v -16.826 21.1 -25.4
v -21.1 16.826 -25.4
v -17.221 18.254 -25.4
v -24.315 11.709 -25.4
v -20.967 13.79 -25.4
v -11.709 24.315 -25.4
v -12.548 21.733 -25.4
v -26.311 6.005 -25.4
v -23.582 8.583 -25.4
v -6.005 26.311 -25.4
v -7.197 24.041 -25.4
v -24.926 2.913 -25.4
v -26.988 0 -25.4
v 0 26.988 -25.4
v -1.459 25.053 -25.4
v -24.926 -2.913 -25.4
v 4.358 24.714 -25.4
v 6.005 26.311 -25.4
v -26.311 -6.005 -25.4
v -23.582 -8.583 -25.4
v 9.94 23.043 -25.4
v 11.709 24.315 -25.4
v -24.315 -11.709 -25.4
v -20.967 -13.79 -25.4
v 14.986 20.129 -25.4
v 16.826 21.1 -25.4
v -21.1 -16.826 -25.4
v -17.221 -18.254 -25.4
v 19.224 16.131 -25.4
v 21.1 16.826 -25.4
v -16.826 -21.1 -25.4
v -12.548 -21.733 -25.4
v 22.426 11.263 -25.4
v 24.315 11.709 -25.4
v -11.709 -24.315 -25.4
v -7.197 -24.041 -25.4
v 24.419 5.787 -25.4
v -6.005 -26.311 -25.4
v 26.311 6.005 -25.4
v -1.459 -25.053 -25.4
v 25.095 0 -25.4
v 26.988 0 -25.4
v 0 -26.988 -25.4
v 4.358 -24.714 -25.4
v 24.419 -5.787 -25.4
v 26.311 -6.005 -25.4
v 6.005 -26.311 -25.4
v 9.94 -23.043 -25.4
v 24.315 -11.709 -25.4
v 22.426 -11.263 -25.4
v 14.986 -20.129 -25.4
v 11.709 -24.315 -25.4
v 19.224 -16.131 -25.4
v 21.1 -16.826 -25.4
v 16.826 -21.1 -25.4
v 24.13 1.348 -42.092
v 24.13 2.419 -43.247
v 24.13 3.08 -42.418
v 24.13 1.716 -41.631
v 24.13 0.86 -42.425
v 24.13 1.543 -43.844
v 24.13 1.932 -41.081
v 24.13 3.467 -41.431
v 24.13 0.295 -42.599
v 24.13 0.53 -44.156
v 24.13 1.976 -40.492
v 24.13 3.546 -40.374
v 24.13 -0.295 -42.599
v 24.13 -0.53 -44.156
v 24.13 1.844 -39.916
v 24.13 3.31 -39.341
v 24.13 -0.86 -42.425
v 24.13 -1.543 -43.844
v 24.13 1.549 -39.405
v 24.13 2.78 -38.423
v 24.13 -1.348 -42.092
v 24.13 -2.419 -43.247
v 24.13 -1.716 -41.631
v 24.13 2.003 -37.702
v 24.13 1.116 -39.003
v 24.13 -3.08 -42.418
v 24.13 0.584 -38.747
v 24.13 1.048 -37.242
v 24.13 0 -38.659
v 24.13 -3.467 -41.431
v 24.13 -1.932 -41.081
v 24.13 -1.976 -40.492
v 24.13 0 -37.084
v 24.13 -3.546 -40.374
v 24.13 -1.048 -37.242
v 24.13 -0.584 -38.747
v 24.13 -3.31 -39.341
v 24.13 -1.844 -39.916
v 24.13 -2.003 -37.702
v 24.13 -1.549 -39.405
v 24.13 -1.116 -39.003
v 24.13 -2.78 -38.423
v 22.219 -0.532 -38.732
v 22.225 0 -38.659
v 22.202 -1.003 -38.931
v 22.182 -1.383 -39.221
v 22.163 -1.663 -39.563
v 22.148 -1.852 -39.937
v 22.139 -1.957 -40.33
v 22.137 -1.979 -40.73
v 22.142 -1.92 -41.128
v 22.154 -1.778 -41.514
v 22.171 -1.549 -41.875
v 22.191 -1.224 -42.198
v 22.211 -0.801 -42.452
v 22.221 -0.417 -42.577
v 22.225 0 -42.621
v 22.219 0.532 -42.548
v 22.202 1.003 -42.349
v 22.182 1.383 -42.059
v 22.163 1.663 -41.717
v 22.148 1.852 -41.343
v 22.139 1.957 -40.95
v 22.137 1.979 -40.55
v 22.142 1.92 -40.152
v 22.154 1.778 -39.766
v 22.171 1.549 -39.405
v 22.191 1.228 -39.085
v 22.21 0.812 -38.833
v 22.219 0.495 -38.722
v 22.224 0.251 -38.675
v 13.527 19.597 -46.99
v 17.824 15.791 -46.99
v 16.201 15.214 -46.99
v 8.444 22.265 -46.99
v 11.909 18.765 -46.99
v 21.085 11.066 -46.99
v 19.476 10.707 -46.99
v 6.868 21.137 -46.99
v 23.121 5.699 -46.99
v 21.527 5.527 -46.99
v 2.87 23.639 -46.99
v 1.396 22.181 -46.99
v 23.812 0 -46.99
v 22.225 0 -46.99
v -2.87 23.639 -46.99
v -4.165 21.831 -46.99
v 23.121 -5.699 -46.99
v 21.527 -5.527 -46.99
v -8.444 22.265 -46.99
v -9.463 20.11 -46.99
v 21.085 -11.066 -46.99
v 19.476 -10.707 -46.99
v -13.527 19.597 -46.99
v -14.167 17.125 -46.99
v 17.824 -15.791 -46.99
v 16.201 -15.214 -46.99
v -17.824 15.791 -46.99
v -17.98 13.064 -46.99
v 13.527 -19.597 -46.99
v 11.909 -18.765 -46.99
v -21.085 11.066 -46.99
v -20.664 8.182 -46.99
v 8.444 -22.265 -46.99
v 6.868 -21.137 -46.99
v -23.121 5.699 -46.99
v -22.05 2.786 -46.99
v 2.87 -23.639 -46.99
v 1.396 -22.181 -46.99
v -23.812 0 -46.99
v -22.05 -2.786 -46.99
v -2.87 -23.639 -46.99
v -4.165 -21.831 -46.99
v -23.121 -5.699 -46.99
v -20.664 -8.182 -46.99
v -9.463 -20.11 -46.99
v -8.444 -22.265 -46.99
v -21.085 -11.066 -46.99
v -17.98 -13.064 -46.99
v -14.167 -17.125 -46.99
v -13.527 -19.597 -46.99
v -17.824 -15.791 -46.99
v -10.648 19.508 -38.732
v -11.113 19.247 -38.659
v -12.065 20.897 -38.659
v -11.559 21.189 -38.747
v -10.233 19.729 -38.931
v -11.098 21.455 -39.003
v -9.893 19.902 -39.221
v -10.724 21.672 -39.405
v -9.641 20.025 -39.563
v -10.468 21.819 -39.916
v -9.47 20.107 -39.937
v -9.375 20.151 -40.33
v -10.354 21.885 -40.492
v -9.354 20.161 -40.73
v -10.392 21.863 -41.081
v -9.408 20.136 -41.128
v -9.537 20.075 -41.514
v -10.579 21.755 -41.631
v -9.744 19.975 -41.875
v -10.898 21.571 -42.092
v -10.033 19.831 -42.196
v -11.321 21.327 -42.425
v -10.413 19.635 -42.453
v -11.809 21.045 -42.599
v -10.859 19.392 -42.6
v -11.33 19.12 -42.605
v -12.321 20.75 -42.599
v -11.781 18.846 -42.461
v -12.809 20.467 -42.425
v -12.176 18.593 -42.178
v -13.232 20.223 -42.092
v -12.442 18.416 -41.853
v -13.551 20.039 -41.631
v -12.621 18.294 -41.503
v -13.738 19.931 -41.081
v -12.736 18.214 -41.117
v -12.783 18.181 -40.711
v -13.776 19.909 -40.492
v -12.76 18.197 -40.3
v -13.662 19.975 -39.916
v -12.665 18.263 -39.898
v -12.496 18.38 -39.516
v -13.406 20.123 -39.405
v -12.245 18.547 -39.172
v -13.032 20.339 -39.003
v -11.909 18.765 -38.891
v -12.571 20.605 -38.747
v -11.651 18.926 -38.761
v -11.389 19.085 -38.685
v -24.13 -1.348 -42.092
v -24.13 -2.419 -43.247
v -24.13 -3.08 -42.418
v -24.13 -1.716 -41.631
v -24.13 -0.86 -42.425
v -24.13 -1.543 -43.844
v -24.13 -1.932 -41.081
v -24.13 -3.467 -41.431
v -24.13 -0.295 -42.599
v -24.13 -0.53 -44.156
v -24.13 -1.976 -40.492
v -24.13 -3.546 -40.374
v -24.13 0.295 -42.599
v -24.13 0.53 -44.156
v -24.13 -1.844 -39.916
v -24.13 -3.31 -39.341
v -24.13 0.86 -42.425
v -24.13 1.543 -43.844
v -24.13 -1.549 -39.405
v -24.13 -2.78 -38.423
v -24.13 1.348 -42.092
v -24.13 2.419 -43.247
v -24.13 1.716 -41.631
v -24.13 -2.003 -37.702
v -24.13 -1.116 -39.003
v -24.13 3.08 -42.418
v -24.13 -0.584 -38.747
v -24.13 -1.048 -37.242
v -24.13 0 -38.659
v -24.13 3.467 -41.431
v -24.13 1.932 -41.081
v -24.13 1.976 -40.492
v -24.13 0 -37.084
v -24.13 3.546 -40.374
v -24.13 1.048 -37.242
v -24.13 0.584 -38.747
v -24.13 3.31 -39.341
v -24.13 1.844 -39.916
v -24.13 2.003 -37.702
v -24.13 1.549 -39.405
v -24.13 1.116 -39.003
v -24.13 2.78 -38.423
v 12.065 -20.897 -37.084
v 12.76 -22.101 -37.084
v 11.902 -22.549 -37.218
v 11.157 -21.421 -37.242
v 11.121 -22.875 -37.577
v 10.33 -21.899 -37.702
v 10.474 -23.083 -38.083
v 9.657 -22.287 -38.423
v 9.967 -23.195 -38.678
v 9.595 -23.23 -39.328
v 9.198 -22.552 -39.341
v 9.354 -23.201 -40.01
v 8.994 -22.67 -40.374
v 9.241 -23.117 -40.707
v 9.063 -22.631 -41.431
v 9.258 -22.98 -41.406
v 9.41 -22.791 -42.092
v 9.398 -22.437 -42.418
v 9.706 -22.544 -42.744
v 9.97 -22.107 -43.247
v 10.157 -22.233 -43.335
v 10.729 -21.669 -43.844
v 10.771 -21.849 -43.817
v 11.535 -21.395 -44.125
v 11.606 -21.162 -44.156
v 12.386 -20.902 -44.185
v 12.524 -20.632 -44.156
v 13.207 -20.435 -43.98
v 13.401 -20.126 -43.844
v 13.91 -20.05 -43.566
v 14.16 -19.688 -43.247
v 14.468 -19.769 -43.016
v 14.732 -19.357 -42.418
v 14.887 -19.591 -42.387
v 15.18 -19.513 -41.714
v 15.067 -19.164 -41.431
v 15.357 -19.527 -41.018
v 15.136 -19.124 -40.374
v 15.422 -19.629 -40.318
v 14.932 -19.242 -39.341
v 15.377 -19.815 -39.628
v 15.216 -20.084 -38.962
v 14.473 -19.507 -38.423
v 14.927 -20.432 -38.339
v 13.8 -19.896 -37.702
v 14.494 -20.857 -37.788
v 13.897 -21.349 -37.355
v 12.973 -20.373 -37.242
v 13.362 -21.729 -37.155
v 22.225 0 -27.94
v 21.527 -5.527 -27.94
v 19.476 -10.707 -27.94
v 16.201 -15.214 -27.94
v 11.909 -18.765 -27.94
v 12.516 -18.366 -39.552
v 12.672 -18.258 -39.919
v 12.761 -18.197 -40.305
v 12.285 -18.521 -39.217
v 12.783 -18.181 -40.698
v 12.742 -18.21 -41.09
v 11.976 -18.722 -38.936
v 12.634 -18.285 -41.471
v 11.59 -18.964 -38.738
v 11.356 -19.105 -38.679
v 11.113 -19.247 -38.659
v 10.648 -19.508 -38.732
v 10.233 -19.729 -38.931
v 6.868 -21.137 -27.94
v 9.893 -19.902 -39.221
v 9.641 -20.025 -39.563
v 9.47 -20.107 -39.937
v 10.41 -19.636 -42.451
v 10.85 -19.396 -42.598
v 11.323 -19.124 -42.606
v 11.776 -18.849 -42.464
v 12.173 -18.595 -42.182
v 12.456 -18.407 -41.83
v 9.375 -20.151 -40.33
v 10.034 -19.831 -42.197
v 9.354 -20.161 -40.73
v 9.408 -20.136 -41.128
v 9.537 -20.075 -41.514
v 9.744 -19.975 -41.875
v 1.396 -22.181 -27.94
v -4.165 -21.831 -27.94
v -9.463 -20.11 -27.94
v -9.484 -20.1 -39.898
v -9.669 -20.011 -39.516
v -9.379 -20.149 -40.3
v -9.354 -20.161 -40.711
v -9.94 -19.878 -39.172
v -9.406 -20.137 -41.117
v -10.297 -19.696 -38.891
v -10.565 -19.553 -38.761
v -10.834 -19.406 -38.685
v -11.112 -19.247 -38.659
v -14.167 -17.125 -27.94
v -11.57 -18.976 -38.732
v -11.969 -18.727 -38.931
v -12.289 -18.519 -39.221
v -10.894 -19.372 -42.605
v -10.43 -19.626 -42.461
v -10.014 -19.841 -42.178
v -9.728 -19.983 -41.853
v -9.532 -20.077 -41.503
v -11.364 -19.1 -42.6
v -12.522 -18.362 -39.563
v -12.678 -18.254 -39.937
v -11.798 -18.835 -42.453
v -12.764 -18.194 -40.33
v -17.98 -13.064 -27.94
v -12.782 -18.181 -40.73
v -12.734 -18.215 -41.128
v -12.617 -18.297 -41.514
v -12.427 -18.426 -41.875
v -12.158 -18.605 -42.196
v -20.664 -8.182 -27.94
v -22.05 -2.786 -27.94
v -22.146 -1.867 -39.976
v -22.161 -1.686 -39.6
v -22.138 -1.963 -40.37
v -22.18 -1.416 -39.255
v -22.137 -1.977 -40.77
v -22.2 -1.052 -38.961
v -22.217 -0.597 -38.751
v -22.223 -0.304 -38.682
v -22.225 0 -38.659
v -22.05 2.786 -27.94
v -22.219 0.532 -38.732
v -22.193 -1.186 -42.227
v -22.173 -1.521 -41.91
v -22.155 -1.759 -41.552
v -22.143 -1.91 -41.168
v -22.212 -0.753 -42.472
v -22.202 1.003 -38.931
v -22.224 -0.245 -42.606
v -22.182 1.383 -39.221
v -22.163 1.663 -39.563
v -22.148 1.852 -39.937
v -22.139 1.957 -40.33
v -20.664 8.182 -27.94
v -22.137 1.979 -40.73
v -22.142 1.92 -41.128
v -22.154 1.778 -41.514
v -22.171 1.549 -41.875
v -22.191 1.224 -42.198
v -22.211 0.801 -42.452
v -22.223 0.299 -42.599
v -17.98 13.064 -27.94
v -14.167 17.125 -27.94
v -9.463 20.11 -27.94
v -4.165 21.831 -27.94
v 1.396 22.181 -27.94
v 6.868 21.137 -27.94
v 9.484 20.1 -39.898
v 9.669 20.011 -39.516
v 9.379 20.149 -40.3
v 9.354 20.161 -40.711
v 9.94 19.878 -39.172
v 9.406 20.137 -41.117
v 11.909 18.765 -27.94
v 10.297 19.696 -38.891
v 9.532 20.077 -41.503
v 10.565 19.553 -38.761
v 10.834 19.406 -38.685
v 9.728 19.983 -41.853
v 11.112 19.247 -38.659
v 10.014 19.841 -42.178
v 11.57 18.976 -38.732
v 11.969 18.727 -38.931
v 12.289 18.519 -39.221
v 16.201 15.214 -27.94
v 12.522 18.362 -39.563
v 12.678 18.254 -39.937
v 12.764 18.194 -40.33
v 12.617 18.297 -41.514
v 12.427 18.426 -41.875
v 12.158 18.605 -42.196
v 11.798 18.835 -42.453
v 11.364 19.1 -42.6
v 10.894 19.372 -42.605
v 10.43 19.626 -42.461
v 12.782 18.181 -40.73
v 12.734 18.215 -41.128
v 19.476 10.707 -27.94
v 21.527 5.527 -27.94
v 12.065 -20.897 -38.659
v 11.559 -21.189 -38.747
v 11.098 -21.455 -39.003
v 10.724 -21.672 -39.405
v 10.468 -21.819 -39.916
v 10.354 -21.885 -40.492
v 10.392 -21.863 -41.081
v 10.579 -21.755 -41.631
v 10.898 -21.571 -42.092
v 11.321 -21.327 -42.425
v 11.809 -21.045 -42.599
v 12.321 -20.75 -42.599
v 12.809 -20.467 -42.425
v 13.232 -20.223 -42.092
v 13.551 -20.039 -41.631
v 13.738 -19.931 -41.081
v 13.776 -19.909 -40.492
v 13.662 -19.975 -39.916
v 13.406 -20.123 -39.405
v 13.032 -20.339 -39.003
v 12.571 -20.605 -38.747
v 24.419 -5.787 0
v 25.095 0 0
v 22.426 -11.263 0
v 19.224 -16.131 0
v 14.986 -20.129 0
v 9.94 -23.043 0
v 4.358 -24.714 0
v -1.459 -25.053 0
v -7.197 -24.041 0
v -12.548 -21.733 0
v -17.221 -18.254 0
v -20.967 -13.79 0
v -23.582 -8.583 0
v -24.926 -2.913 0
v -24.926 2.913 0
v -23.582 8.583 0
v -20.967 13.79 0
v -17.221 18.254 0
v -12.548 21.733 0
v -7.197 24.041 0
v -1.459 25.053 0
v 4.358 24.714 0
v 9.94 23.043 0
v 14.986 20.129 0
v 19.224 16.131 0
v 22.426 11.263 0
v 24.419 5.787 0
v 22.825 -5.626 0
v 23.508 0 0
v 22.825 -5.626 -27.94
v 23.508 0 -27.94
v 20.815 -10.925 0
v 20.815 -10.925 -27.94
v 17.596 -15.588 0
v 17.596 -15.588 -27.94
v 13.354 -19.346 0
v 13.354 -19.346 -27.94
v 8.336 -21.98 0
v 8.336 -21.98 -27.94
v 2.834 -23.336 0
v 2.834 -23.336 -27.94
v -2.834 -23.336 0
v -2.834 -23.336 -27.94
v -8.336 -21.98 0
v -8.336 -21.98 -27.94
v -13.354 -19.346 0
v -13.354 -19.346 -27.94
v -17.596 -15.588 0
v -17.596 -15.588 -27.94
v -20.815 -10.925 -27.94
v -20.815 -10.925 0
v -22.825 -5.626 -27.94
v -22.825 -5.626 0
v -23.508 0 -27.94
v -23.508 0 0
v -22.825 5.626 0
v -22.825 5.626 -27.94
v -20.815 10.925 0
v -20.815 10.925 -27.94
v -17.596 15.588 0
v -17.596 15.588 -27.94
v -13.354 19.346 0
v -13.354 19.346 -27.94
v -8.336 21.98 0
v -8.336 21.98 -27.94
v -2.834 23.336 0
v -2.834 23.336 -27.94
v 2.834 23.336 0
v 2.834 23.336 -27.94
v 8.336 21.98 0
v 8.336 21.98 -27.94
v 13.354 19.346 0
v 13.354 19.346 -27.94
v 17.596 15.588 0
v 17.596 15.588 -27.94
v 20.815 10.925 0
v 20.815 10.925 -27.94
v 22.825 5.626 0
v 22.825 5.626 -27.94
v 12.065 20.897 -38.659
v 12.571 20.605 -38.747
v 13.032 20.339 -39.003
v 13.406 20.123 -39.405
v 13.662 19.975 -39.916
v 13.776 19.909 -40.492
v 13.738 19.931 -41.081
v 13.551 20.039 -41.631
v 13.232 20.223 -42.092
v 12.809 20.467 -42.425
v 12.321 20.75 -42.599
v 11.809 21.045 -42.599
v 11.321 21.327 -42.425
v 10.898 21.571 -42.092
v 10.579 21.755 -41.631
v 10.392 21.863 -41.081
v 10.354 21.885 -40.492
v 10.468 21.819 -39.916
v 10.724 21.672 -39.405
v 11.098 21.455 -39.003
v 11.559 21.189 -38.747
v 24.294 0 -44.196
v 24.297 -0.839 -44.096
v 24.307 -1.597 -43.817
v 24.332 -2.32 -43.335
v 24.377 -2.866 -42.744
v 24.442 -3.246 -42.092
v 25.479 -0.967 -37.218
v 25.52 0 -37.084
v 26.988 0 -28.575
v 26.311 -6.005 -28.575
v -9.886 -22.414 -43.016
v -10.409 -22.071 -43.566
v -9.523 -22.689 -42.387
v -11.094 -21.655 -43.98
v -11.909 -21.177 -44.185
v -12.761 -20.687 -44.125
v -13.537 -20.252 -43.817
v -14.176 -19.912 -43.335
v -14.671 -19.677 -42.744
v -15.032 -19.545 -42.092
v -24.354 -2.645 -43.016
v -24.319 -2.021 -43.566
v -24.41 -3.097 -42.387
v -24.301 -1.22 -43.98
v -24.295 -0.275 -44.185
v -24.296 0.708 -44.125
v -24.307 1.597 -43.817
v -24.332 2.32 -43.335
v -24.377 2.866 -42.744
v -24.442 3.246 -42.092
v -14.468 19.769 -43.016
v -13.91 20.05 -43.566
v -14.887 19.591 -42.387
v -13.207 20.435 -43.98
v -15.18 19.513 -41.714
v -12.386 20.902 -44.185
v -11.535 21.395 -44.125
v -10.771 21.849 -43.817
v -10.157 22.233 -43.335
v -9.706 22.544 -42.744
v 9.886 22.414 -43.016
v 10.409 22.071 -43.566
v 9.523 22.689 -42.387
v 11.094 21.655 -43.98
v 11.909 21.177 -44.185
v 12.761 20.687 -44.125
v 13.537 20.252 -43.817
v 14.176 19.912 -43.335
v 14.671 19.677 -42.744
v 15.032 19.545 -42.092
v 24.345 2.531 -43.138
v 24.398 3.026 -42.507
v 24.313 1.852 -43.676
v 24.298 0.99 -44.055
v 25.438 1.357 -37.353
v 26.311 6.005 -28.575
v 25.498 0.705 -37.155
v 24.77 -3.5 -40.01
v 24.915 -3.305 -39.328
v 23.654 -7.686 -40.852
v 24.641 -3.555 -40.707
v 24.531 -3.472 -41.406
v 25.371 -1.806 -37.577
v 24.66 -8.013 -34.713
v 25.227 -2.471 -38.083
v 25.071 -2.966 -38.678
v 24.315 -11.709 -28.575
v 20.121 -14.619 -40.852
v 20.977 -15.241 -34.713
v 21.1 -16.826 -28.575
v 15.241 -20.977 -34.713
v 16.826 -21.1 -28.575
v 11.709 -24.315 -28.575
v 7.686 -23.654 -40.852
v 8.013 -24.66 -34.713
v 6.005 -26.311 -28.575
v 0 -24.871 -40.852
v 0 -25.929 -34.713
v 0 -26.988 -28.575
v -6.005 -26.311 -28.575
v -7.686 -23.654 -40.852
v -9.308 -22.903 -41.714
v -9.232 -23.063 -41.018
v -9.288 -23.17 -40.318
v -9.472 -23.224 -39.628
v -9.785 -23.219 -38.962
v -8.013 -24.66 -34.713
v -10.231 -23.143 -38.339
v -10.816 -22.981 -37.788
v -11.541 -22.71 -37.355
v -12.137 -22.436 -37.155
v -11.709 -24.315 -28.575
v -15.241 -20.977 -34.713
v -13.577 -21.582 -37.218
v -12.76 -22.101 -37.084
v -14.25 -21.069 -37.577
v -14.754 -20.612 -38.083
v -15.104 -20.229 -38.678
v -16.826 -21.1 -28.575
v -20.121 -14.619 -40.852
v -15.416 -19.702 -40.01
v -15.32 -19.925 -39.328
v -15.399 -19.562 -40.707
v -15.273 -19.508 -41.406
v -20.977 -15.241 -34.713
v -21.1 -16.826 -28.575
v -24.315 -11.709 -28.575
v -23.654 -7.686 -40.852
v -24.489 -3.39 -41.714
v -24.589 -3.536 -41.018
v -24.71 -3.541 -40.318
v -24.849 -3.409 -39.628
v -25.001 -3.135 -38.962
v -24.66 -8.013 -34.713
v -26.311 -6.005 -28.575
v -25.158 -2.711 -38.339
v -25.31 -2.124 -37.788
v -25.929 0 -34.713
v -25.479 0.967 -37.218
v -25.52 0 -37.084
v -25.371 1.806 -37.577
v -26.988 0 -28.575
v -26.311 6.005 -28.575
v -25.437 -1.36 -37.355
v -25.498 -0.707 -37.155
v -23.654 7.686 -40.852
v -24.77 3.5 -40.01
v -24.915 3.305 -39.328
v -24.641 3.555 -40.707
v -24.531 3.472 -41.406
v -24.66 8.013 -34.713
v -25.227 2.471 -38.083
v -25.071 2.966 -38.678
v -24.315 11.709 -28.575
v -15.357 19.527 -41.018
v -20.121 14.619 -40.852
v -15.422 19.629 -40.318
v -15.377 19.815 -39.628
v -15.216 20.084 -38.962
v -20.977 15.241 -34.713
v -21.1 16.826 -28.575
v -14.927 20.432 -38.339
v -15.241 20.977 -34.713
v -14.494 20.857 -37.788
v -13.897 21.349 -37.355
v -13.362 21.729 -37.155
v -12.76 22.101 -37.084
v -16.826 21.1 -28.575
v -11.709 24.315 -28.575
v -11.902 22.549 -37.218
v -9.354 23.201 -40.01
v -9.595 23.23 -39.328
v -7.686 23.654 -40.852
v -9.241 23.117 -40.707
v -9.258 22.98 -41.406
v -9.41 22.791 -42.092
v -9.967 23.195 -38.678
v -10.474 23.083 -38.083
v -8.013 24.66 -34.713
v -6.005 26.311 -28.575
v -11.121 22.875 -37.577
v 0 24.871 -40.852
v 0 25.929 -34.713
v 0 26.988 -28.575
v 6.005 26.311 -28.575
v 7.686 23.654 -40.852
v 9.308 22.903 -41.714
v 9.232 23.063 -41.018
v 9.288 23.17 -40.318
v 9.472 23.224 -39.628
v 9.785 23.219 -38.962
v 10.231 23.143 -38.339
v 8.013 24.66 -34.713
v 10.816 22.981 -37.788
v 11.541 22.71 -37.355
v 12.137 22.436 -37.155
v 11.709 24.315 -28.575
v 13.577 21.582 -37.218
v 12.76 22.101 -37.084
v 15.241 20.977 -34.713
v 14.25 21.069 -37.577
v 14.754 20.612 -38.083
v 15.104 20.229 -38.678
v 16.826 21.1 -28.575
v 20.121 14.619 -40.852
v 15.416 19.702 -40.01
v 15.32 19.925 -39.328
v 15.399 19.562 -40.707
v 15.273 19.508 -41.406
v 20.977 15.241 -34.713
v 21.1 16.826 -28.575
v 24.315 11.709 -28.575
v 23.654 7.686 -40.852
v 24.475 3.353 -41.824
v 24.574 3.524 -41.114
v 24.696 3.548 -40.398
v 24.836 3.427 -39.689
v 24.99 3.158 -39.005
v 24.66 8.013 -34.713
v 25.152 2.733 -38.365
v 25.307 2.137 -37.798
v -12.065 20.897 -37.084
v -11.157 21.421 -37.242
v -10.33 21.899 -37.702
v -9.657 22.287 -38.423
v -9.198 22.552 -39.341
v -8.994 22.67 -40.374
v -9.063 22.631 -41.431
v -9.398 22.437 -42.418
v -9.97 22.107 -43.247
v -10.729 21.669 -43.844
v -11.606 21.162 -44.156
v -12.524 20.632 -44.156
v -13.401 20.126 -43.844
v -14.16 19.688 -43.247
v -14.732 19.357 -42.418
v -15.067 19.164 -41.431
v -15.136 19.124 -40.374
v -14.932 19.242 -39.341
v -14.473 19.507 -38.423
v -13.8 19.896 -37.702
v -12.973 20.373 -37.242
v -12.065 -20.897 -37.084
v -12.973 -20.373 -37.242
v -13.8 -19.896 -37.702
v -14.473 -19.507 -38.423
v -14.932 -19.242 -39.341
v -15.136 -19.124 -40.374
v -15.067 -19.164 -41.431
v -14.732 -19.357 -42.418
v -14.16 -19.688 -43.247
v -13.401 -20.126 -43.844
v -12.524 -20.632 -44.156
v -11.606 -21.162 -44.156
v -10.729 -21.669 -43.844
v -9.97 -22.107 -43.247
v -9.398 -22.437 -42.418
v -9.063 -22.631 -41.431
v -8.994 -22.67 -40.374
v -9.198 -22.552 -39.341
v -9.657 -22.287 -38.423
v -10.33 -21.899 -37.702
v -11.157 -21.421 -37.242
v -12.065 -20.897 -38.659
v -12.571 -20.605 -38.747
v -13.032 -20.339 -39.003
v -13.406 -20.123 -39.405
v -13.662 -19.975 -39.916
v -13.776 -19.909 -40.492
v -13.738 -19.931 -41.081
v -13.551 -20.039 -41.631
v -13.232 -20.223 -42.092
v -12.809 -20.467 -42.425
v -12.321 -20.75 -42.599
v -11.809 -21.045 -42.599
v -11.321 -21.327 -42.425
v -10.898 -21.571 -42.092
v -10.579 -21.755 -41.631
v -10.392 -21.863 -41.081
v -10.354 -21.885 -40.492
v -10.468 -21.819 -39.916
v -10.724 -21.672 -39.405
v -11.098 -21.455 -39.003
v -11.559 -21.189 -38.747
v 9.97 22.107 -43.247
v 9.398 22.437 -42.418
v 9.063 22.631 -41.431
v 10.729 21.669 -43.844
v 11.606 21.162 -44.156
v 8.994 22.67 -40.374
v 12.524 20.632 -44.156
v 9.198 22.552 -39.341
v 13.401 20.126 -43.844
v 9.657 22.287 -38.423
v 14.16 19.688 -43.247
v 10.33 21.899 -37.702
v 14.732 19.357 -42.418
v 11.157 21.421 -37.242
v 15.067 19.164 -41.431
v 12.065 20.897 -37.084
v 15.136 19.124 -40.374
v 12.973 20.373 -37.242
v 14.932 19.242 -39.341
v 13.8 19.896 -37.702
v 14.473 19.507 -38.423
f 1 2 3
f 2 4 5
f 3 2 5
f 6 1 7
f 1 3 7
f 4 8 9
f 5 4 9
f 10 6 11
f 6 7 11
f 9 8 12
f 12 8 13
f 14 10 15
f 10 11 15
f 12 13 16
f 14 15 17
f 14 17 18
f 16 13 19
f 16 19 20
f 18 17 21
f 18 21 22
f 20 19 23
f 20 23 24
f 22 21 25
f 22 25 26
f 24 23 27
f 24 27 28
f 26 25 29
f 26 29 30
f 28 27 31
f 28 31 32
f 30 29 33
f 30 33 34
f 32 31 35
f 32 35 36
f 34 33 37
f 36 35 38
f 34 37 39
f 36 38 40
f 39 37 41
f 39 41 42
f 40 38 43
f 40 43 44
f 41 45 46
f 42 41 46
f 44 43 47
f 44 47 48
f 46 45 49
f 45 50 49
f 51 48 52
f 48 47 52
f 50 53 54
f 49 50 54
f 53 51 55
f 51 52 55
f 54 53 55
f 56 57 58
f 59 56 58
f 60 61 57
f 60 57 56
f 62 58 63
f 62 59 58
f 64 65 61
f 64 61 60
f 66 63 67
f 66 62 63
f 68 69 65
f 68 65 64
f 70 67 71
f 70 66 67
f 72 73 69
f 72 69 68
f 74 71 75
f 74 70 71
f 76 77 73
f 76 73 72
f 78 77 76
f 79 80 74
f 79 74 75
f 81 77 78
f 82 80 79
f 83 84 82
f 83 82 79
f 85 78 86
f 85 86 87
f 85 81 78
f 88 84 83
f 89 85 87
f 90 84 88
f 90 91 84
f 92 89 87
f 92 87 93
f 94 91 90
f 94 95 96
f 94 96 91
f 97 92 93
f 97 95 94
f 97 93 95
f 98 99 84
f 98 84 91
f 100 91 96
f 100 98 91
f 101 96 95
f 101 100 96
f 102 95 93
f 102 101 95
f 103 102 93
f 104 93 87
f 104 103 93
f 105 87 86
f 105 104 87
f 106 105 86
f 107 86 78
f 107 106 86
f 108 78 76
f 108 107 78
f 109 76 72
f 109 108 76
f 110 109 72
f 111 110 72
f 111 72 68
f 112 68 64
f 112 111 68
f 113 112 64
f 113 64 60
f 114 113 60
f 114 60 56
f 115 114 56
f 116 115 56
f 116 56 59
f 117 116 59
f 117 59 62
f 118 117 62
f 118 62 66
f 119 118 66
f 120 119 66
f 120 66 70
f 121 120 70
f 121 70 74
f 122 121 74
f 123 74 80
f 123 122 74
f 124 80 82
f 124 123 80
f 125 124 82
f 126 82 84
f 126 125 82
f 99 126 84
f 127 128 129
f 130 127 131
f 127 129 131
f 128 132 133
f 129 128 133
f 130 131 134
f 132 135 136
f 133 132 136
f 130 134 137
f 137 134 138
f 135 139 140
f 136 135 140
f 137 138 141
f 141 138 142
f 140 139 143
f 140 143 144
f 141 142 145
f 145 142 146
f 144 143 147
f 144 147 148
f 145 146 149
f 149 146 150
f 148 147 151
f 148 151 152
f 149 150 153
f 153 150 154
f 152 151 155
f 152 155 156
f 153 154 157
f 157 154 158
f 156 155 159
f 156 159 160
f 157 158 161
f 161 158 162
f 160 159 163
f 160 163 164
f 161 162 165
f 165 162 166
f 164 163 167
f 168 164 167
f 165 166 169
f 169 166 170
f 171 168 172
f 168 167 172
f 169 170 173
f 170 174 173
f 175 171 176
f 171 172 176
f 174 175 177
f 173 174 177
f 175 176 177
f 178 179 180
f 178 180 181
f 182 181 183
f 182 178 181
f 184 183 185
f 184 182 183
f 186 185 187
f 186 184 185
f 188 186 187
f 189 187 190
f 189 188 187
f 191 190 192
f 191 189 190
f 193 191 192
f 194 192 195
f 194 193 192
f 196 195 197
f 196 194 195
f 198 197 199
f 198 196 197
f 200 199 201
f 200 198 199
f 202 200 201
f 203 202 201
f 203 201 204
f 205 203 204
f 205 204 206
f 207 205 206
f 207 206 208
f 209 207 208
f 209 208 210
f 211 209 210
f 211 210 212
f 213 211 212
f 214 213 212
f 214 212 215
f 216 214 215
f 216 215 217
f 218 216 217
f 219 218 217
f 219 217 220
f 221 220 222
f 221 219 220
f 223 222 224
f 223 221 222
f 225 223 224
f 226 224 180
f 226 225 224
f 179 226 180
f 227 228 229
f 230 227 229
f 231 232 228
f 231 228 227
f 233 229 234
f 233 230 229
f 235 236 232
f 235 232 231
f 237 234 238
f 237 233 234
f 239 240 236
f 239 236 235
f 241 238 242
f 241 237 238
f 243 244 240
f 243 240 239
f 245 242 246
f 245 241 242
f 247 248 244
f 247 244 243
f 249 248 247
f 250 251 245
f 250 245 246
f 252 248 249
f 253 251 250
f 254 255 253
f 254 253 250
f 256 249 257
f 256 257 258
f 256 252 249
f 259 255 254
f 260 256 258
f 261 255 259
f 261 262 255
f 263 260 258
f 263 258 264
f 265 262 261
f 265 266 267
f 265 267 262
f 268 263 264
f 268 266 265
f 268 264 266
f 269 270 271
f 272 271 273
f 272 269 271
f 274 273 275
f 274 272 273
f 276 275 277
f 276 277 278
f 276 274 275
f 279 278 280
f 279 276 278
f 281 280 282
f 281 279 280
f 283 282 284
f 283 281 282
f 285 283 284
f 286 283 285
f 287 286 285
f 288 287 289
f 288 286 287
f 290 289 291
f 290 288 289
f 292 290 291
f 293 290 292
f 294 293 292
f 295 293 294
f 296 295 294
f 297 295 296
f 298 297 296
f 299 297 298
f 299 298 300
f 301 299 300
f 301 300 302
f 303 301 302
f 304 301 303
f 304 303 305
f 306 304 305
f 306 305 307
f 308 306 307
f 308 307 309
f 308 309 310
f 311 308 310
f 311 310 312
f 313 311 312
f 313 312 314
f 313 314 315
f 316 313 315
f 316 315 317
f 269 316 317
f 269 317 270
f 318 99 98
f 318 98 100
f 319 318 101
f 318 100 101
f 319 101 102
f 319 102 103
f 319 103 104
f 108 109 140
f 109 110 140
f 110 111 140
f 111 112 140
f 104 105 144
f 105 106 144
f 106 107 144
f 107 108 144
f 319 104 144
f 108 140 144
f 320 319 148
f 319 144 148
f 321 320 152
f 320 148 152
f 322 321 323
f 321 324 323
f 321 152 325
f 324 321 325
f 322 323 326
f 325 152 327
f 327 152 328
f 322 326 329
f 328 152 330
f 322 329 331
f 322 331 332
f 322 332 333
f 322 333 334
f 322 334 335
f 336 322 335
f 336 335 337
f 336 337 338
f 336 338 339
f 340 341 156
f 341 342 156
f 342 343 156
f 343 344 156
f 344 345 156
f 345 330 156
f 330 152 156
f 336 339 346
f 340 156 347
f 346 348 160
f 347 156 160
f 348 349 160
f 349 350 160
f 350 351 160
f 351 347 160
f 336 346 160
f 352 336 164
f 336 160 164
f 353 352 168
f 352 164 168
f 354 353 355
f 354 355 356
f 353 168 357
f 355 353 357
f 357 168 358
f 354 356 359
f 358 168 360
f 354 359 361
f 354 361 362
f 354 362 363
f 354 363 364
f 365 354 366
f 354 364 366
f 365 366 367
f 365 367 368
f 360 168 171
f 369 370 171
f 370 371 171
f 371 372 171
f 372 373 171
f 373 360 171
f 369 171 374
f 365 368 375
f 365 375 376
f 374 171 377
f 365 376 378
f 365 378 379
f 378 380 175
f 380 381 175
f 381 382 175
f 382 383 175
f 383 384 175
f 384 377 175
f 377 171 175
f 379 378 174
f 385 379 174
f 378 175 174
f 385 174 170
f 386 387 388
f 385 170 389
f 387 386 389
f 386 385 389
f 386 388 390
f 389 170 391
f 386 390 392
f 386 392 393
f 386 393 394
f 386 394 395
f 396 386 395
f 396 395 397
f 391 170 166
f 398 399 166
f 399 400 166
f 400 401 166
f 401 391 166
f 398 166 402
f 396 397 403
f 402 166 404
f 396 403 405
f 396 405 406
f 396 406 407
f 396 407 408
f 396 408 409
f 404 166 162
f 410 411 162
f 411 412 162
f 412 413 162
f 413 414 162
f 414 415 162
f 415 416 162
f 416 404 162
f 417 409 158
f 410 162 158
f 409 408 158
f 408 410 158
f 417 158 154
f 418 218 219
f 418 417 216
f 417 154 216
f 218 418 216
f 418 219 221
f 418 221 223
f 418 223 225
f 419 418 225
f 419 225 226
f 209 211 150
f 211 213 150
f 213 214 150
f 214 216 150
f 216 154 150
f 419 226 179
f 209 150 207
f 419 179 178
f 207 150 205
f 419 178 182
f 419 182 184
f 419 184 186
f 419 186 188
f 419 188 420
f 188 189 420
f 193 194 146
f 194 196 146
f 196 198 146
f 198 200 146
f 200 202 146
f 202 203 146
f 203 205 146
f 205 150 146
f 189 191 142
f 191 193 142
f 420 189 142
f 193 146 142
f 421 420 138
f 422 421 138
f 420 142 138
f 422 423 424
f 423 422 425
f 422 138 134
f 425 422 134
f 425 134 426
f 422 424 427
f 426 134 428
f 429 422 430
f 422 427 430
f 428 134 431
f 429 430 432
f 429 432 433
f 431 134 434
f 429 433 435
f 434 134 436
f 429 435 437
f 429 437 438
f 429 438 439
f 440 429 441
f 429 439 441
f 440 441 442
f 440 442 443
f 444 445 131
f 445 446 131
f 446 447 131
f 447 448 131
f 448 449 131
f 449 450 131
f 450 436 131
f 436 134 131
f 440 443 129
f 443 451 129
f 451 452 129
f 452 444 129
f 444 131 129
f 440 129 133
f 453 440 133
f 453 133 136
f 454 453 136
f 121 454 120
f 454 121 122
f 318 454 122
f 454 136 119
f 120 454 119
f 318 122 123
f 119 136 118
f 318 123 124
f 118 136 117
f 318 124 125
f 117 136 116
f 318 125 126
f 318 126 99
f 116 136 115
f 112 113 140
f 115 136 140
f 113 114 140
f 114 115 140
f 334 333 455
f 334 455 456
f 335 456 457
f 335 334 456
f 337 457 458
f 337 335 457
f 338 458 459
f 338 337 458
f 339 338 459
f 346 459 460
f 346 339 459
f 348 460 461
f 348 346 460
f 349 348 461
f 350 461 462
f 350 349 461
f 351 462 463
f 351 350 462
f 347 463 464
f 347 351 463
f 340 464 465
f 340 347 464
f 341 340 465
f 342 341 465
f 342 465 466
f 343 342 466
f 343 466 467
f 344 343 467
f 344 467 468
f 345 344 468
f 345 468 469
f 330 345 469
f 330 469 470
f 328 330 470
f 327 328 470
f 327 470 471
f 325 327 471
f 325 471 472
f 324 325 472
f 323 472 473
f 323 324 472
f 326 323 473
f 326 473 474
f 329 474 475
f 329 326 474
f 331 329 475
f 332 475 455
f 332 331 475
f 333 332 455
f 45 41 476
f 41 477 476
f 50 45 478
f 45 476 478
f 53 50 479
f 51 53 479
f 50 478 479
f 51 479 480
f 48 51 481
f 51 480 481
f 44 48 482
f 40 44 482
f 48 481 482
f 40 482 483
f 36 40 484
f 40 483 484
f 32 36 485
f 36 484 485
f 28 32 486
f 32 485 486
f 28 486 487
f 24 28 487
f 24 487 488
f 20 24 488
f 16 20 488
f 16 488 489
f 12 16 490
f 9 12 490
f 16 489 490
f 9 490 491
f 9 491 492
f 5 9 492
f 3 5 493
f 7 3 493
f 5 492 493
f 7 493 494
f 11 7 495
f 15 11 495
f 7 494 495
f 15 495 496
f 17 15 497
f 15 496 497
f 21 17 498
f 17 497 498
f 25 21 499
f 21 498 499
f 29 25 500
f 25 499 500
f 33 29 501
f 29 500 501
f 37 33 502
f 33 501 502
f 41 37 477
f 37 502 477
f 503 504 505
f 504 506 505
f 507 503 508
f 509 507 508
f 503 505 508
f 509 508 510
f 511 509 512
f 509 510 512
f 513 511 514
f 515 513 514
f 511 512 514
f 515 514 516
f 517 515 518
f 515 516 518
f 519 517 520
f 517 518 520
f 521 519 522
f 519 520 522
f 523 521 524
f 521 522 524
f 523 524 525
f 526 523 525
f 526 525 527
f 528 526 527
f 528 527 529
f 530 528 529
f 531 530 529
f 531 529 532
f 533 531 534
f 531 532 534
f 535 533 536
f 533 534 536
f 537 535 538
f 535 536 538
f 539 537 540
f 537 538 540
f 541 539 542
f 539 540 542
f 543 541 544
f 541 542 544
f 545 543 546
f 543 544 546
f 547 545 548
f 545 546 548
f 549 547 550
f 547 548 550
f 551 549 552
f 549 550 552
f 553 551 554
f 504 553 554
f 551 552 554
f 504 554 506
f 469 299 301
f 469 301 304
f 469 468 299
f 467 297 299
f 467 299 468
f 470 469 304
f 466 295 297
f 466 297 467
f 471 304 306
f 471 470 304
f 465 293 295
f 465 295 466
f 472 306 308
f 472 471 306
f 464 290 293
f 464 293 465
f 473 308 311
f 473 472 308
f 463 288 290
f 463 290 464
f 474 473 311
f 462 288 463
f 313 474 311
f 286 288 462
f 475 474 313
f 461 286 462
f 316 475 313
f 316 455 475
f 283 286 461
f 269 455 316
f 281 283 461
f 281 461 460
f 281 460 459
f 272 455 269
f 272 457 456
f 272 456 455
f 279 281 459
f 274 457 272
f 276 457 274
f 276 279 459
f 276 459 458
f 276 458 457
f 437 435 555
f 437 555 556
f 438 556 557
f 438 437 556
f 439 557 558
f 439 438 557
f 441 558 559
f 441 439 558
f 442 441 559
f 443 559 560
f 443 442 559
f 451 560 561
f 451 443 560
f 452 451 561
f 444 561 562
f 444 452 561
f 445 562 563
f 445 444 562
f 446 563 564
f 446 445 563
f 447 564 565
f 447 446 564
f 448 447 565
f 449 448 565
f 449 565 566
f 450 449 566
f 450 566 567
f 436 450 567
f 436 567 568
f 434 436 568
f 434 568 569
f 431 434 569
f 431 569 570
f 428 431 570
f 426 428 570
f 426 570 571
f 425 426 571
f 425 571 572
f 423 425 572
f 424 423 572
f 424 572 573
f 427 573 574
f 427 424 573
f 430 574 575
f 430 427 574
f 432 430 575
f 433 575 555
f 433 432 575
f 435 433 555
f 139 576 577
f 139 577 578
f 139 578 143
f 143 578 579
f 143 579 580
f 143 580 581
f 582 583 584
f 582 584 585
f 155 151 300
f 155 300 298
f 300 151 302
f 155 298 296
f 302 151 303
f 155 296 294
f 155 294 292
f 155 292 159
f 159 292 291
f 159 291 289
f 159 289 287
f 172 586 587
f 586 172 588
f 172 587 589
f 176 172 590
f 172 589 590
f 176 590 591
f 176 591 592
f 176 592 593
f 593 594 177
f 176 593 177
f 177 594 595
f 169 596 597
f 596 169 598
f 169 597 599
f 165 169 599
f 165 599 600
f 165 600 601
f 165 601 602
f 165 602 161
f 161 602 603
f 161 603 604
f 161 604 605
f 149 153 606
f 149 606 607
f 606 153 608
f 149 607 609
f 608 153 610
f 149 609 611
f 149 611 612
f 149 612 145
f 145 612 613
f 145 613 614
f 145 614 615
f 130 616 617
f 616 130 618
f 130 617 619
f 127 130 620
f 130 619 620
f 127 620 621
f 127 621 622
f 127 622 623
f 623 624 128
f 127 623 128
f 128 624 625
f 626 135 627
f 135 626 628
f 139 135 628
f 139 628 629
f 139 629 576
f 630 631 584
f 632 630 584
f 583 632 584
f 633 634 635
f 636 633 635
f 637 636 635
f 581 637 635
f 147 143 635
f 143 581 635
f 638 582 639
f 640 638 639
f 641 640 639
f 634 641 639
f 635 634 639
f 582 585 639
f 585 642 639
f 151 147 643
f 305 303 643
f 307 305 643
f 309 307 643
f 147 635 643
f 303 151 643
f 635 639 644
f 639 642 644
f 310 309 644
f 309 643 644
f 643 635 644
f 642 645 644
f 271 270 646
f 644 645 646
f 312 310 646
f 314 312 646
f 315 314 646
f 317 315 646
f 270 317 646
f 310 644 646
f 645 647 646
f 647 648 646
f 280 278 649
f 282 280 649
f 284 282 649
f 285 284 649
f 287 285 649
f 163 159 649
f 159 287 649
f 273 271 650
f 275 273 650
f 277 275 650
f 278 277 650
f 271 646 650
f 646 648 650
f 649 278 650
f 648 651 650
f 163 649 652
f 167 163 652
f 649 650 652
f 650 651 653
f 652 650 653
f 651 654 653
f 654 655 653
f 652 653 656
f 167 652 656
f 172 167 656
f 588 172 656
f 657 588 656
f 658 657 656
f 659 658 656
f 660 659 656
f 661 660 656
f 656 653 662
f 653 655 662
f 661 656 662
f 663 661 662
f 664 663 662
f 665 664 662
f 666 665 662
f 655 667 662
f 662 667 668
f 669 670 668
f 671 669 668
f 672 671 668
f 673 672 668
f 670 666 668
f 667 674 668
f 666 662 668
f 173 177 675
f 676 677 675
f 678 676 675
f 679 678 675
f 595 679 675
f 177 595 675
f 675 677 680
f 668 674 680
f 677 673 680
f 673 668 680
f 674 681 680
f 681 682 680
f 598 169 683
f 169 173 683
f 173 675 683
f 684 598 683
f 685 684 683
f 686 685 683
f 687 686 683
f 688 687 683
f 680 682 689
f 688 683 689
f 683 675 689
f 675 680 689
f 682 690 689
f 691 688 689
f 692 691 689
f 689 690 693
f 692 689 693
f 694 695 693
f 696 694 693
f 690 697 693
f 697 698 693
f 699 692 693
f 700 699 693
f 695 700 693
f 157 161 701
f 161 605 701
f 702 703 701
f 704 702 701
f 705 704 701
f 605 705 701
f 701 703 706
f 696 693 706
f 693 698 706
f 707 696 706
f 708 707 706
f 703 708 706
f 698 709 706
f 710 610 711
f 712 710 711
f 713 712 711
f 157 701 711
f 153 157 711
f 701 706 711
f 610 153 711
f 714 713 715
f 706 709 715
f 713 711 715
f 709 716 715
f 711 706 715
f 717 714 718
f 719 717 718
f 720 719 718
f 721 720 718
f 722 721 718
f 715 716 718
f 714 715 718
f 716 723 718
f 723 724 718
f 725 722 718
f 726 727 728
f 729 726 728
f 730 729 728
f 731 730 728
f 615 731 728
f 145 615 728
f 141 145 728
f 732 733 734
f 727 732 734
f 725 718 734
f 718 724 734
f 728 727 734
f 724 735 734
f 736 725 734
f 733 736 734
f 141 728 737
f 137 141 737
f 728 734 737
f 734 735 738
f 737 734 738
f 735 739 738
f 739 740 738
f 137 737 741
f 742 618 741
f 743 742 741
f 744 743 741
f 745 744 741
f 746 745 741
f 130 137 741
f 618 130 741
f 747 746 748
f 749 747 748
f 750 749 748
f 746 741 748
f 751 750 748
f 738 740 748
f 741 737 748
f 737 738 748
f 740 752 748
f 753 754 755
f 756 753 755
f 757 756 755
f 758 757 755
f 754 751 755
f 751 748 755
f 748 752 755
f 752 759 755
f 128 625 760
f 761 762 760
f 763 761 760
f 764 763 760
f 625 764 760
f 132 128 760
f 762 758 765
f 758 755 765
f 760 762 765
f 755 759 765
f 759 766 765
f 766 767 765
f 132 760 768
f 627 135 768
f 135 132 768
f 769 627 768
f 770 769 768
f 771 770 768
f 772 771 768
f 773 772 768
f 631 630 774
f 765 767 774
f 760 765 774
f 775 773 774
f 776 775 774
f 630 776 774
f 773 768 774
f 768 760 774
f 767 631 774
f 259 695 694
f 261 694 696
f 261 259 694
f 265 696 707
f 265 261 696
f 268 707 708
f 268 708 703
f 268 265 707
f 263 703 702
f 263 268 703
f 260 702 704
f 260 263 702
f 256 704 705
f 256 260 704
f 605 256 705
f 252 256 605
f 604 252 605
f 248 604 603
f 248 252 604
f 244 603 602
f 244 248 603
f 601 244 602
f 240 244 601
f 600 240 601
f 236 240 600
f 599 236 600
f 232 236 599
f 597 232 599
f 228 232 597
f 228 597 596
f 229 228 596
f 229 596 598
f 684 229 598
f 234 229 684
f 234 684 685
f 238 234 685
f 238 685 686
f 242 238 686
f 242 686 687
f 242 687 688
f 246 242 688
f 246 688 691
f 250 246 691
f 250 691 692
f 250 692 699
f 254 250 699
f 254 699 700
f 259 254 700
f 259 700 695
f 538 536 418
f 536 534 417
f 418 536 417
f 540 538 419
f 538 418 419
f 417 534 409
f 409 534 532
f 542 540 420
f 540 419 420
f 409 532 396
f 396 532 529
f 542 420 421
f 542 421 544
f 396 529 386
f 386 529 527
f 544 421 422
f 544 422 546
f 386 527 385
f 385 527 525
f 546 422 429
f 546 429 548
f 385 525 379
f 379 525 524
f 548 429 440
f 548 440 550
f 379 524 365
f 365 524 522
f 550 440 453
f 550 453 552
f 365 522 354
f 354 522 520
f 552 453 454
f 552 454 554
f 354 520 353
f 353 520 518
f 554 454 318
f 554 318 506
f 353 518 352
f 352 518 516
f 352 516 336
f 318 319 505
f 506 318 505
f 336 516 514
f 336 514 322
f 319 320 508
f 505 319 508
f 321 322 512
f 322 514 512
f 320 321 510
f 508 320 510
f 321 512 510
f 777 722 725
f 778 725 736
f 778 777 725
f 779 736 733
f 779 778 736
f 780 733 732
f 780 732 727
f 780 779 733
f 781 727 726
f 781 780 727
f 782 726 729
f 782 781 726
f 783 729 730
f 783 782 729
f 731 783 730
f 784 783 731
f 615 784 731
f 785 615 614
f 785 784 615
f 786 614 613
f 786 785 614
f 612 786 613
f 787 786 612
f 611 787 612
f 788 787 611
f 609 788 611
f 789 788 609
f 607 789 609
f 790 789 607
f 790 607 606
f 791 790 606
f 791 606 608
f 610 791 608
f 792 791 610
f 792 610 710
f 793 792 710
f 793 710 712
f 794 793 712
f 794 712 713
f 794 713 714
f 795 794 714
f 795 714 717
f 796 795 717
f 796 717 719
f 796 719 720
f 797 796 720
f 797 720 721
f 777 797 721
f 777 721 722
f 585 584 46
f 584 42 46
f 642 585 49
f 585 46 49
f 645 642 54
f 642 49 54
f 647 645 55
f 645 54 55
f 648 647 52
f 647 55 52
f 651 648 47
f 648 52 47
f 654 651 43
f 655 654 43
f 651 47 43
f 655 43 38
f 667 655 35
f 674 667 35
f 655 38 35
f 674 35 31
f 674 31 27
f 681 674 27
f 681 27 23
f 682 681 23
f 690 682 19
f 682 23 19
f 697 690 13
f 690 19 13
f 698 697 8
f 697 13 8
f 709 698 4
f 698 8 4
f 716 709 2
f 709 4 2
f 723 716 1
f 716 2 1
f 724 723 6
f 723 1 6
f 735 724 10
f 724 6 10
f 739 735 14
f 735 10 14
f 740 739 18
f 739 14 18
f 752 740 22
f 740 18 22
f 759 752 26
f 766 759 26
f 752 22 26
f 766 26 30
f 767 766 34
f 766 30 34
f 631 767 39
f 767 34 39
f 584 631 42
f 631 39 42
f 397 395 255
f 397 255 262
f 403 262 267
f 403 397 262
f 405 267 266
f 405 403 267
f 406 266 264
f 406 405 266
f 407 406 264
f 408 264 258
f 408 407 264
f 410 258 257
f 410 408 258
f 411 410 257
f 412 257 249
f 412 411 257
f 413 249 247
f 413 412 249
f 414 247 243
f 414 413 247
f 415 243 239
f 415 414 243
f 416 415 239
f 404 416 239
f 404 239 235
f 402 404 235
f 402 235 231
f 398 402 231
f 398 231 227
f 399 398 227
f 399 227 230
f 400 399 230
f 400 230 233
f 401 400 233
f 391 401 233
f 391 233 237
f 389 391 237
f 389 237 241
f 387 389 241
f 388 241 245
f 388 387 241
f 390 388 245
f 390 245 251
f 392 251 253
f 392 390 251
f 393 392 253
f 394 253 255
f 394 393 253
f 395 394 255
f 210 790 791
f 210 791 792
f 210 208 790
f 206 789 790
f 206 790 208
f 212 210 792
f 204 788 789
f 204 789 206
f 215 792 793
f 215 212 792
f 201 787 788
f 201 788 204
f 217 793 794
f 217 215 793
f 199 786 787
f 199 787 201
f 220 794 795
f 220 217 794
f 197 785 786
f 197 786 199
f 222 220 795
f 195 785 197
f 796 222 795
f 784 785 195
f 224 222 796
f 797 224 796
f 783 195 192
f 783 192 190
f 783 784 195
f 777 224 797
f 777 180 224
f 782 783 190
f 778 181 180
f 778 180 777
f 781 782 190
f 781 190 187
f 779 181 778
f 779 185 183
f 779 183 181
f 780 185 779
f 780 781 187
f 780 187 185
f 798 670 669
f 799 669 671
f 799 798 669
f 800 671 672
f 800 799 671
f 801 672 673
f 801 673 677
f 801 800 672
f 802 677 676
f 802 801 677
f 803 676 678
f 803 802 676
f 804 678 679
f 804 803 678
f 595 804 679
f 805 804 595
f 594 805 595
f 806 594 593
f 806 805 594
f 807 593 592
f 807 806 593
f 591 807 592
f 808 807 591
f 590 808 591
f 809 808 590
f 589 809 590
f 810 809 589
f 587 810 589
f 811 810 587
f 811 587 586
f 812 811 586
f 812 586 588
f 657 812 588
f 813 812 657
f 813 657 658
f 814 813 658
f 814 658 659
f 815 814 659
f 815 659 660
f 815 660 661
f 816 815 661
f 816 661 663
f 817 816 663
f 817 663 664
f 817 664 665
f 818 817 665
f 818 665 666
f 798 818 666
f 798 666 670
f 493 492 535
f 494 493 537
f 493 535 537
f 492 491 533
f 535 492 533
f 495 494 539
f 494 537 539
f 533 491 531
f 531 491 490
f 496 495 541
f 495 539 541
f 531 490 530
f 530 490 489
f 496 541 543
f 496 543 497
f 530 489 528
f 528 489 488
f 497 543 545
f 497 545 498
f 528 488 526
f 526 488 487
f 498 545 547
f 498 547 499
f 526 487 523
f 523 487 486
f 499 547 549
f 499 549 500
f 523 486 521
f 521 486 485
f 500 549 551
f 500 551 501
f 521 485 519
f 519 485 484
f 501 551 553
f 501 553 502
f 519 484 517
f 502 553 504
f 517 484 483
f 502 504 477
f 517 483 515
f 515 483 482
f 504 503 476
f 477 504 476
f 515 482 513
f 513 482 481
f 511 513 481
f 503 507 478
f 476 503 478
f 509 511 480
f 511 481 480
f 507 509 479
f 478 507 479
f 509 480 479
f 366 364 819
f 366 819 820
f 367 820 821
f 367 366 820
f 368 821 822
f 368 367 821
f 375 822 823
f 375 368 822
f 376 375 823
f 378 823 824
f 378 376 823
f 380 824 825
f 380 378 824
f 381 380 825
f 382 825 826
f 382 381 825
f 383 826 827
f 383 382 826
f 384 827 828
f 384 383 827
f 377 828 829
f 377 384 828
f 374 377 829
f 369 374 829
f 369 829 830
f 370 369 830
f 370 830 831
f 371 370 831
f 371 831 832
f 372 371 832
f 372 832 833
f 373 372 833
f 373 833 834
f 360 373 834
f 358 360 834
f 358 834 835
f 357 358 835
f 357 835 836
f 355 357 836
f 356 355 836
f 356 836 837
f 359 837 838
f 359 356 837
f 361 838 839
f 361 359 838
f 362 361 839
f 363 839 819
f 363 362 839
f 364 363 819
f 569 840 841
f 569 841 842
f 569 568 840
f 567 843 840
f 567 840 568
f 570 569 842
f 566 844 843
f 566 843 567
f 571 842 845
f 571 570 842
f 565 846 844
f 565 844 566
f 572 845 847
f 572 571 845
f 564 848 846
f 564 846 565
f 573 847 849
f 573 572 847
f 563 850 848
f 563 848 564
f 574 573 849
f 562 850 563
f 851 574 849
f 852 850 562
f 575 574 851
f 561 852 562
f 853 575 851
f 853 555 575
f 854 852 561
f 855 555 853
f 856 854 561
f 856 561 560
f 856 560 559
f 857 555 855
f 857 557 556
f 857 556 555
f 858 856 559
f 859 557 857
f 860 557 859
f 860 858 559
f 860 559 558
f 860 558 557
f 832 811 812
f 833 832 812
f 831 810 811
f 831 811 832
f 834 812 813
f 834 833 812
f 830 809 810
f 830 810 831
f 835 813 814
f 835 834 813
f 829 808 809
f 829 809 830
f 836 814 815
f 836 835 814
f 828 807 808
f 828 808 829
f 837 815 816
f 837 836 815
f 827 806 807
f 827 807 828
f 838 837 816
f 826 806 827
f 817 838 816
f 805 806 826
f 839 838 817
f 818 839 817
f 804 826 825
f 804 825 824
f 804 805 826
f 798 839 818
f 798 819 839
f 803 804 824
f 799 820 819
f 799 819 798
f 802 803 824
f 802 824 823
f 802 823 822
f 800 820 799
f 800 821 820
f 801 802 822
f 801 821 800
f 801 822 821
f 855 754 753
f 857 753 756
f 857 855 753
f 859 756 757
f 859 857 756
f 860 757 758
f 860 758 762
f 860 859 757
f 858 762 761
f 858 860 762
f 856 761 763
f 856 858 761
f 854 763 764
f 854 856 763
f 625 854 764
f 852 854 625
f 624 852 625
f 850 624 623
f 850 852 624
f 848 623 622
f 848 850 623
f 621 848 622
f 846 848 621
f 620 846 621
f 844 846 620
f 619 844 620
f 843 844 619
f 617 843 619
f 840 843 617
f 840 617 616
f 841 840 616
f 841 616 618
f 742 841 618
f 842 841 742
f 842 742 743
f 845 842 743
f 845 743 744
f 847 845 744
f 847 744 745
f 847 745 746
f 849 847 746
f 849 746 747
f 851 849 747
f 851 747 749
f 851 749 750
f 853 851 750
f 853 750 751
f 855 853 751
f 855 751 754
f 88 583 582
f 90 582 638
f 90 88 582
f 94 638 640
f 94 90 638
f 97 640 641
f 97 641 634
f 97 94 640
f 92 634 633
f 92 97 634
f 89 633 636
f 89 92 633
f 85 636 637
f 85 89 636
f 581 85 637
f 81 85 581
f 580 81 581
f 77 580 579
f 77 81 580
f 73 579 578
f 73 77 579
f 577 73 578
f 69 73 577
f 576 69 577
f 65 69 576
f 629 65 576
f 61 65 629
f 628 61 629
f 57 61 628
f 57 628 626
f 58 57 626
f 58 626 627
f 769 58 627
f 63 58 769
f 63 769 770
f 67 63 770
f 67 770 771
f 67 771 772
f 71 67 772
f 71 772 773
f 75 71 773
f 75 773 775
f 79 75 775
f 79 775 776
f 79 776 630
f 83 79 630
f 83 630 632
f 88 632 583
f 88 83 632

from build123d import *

# Parameters (mm, degrees)
SKETCH2_R          = 1.9812
CUT_EXTRUDE1_DEPTH = 61.53685169
CUT_EXTRUDE2_START = 24.13
SKETCH3_R          = 3.556
CUT_EXTRUDE2_DEPTH = 2.54
CIRPATTERN1_COUNT  = 6


with BuildPart() as part:
    # Sketch1 → Revolve1 (revolve)
    with BuildSketch(Plane(origin=(0, 0, 0), x_dir=(0, 0, -1), z_dir=(1, 0, 0)), mode=Mode.PRIVATE) as revolve1_sk:
        Polygon((0, 23.5077), (27.94, 23.5077), (27.94, 22.225), (46.99, 22.225), (46.99, 23.8125), (28.575, 26.9875), (25.4, 26.9875), (25.4, 25.0952), (0, 25.0952), align=None)
    revolve(revolve1_sk.sketch.rotate(Axis((0, 0, 0), (0, 0, -1)), 90), axis=Axis((0, 0, 0), (0, 0, -1)))

    # Sketch2 → Cut-Extrude1 (cut, through all)
    with BuildSketch(Plane(origin=(0, 0, 0), x_dir=(0, 0, -1), z_dir=(1, 0, 0))):
        with Locations(Location((40.64, 0, 0), (0, 0, 179.999999954))):
            Circle(SKETCH2_R)
    cut_extrude1 = extrude(amount=CUT_EXTRUDE1_DEPTH, mode=Mode.SUBTRACT)

    # Sketch3 → Cut-Extrude2 (cut)
    with BuildSketch(Plane(origin=(0, 0, 0), x_dir=(0, 0, -1), z_dir=(1, 0, 0)).offset(CUT_EXTRUDE2_START)):
        with Locations(Location((40.64, 0, 0), (0, 0, 179.999999954))):
            Circle(SKETCH3_R)
    cut_extrude2 = extrude(amount=CUT_EXTRUDE2_DEPTH, mode=Mode.SUBTRACT)

    # CirPattern1: Cut-Extrude1, Cut-Extrude2 ×6 about axis
    cirpattern1_axis = Axis((0, 0, 0), (0, 0, 1))
    add([cut_extrude1.rotate(cirpattern1_axis, i * 360 / CIRPATTERN1_COUNT) for i in range(1, CIRPATTERN1_COUNT)], mode=Mode.SUBTRACT)
    add([cut_extrude2.rotate(cirpattern1_axis, i * 360 / CIRPATTERN1_COUNT) for i in range(1, CIRPATTERN1_COUNT)], mode=Mode.SUBTRACT)


solid = part.part
